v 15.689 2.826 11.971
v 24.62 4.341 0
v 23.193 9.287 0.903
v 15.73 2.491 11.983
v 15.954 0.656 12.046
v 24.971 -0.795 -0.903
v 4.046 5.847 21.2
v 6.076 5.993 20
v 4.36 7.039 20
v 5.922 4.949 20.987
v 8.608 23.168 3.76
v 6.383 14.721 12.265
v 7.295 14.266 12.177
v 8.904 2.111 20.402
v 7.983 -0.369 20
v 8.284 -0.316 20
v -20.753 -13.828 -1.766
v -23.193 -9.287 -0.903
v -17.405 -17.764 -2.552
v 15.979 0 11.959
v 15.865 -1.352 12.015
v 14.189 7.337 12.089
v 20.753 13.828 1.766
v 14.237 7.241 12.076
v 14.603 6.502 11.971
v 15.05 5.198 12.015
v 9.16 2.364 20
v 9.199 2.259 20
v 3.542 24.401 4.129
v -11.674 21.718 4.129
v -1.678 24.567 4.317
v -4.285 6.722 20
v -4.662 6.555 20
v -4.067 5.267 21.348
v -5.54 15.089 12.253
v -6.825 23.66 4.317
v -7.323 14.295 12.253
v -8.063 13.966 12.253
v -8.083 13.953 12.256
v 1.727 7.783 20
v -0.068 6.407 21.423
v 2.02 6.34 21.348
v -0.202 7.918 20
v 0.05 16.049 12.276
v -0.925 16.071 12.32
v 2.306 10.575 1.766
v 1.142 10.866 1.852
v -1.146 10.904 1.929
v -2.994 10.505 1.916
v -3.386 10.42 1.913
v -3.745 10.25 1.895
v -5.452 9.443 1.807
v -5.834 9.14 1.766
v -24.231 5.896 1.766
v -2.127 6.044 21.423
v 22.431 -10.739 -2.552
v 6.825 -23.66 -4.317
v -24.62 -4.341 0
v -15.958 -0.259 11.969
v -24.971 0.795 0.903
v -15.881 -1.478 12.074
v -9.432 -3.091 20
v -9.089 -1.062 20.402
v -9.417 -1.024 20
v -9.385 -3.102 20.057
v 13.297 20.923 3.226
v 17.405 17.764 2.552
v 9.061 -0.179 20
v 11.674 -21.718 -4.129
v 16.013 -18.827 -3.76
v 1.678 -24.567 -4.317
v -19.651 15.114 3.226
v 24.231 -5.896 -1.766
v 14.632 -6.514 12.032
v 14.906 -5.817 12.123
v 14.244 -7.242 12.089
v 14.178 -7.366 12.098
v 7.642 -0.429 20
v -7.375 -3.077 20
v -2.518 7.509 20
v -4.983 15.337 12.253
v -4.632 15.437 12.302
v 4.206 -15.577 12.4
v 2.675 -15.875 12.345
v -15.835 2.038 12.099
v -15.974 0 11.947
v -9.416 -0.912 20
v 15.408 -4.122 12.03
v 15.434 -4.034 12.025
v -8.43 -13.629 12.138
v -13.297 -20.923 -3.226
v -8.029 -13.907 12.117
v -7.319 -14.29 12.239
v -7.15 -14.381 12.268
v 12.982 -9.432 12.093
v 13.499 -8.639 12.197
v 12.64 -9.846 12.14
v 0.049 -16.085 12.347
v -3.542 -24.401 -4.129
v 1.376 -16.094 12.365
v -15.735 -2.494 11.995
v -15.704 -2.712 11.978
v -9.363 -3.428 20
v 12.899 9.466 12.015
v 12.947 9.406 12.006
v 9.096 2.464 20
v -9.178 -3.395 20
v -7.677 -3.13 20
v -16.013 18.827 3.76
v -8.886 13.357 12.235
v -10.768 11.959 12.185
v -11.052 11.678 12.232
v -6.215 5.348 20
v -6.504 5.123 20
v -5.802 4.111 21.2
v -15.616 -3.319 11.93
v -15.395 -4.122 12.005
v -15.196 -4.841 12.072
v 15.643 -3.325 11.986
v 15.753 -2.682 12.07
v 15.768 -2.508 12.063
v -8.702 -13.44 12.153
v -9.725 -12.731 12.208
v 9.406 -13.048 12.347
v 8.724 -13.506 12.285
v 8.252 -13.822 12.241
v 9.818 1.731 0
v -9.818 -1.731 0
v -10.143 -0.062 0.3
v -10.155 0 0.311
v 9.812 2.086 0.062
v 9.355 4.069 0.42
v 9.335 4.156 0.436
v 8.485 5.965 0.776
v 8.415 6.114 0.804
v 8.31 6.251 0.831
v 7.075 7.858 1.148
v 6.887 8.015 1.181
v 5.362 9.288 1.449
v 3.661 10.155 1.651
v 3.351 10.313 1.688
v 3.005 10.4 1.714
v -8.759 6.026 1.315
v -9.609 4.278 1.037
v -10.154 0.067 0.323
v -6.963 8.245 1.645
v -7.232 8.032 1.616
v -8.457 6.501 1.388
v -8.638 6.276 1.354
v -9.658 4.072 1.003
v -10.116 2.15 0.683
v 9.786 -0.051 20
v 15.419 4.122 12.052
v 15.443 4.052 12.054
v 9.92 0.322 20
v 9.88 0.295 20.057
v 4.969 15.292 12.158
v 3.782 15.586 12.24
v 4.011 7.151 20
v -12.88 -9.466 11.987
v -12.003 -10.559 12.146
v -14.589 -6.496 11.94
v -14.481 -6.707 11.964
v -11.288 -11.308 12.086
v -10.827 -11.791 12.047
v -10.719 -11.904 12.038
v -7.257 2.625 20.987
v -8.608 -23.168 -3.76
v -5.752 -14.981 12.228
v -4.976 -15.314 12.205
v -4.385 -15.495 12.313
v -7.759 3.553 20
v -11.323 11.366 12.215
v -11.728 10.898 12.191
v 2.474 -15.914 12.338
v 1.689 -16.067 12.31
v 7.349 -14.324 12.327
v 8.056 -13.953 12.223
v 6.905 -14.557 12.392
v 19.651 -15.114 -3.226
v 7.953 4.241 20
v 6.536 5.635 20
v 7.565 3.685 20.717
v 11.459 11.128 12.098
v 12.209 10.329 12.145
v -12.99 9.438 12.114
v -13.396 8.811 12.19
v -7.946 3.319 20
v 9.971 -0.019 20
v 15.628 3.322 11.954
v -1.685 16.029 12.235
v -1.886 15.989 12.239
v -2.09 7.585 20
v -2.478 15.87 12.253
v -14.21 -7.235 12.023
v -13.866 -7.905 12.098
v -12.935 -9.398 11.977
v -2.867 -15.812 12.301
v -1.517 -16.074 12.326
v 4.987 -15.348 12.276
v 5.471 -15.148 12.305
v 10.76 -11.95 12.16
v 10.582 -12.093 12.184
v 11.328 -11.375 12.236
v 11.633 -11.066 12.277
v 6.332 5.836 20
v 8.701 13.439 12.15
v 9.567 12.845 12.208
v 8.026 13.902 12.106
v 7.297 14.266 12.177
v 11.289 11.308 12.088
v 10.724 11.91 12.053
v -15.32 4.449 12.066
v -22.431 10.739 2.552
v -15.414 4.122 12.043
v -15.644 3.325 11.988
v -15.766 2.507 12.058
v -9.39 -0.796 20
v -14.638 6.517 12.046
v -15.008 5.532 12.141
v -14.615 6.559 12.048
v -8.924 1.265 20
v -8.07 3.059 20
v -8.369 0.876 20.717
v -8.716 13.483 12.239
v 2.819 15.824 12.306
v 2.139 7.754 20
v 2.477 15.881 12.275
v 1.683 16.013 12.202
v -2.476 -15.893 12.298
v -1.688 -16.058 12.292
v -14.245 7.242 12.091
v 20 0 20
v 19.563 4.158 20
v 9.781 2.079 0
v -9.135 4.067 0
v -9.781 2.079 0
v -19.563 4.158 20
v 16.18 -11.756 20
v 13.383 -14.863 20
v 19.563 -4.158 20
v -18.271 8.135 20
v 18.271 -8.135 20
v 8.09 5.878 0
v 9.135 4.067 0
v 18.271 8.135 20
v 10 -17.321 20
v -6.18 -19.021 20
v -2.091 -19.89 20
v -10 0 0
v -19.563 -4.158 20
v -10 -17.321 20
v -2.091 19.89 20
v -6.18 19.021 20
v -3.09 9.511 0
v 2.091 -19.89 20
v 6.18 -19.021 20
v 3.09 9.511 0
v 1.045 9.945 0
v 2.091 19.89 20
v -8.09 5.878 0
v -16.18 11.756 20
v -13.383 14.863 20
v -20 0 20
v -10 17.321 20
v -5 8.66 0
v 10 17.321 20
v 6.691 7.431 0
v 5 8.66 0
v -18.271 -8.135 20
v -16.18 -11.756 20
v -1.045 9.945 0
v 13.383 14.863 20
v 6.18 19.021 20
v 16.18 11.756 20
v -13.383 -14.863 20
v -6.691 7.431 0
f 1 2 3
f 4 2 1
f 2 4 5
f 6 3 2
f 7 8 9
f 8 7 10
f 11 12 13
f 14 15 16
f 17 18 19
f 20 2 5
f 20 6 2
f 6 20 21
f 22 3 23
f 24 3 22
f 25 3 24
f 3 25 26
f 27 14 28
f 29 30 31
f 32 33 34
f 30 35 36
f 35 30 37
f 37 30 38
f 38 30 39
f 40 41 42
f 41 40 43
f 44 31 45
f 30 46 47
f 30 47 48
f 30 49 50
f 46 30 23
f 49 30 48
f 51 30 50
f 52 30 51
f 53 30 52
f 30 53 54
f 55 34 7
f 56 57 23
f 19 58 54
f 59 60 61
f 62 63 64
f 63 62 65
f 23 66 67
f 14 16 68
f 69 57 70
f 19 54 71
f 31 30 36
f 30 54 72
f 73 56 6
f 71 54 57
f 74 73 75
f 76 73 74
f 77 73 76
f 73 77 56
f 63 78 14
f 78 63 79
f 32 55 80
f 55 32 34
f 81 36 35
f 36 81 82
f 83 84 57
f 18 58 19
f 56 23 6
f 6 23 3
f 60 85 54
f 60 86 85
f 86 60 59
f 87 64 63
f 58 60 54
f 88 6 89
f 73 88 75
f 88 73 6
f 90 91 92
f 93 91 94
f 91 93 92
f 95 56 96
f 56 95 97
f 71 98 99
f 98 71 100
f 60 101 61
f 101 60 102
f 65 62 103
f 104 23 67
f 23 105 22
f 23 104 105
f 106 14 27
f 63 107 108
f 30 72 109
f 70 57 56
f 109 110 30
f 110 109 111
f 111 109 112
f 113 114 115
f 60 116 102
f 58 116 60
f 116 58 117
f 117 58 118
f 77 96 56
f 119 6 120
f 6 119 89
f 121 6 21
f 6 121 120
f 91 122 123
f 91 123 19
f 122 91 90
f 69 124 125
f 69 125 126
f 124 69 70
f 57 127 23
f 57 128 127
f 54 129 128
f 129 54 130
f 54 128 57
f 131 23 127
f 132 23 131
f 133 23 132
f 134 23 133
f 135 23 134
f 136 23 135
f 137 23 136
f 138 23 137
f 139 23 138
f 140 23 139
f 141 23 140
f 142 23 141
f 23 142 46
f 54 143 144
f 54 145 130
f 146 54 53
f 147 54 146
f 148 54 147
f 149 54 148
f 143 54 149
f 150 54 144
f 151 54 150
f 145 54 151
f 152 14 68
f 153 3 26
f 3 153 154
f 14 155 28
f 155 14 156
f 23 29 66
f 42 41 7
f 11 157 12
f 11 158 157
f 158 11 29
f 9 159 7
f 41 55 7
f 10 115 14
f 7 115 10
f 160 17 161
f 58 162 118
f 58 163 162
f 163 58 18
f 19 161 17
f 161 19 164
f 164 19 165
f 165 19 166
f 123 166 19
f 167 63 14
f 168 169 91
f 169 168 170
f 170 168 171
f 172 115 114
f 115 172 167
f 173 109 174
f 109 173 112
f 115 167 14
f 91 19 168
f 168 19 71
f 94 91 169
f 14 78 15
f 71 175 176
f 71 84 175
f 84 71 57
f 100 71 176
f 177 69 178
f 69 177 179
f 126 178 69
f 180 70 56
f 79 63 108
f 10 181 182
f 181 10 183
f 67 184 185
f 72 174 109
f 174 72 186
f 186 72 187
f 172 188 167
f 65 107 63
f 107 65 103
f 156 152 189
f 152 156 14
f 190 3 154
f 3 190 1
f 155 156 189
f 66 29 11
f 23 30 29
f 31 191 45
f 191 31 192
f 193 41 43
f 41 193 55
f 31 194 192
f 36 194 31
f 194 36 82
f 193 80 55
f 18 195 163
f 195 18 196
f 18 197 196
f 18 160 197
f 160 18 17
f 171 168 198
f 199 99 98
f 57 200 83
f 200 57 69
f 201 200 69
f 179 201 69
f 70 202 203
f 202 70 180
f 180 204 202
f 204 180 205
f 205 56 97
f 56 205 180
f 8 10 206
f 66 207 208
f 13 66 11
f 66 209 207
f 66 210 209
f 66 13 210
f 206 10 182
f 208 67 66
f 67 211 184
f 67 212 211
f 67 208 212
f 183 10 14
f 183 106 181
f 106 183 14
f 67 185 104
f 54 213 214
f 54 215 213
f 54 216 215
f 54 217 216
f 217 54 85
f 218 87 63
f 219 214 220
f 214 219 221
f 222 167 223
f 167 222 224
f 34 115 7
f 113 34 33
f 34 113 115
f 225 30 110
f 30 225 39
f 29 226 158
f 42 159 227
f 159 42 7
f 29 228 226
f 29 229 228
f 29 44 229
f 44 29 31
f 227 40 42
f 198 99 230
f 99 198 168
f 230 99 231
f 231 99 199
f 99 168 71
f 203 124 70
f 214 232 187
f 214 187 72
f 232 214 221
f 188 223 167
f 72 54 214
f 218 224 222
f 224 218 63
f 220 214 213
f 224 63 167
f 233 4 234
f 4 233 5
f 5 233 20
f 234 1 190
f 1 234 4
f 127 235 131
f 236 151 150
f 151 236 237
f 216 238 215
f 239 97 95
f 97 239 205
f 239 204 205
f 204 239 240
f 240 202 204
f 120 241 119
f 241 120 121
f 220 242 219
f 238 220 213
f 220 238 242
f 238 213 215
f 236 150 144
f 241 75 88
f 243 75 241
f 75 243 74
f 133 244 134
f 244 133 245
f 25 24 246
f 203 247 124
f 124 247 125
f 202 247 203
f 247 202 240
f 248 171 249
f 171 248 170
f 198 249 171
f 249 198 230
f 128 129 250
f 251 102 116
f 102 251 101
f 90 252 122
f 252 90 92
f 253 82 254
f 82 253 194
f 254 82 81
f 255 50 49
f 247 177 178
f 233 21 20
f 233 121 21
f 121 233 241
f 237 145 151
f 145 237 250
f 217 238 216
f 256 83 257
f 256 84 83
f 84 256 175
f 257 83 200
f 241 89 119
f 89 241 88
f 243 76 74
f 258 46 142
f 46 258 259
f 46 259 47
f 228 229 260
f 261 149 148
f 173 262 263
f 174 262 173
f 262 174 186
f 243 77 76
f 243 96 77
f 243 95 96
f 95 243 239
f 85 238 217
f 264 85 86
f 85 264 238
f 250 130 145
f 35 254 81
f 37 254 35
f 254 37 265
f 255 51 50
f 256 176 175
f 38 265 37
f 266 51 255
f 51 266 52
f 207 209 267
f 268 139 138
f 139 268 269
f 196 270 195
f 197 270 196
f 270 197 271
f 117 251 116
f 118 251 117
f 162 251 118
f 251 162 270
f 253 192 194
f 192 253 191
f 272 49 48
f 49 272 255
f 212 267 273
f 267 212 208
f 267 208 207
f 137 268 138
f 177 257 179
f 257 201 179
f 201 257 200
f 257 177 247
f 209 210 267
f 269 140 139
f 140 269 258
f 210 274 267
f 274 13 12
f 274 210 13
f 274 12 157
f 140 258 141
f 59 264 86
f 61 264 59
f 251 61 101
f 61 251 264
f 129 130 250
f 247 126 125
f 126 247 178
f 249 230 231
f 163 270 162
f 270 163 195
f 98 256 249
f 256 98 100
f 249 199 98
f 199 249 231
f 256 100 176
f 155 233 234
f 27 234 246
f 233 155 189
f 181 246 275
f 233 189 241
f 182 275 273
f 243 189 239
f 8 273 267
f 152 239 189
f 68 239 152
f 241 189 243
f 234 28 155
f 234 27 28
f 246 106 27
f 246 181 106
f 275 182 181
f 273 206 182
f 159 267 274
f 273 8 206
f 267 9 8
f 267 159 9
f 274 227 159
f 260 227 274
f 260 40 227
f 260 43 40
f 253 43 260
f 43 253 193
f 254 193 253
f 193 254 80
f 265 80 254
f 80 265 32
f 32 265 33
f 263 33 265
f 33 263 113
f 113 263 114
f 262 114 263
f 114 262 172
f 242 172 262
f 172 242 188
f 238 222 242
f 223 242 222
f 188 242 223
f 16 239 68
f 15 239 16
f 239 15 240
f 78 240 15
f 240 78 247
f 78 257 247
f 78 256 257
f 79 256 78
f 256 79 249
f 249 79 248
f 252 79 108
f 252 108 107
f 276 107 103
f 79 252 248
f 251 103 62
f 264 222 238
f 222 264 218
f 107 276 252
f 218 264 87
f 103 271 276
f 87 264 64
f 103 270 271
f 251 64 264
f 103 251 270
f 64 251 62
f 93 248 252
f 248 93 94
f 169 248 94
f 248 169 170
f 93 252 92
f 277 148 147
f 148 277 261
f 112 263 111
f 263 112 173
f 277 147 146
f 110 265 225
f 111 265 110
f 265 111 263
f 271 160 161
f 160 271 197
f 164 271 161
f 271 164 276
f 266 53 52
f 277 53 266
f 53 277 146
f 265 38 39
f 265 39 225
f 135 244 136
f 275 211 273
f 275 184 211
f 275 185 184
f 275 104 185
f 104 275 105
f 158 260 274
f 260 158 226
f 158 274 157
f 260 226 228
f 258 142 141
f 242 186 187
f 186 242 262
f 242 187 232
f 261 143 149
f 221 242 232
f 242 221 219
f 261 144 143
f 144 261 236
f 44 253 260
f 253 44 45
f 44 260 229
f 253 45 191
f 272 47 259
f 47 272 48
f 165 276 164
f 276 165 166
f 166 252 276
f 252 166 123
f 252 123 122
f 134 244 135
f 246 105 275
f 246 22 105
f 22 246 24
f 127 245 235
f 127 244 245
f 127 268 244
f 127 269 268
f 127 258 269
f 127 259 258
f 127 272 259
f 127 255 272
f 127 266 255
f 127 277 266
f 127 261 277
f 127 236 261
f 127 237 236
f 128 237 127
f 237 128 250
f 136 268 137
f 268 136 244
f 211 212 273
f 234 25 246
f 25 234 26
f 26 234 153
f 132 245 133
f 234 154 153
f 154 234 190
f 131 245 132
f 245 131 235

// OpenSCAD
rotate([10,0,10])
cylinder(20,25,10);

translate(0,10,0)
	cylinder(20,10,20);
